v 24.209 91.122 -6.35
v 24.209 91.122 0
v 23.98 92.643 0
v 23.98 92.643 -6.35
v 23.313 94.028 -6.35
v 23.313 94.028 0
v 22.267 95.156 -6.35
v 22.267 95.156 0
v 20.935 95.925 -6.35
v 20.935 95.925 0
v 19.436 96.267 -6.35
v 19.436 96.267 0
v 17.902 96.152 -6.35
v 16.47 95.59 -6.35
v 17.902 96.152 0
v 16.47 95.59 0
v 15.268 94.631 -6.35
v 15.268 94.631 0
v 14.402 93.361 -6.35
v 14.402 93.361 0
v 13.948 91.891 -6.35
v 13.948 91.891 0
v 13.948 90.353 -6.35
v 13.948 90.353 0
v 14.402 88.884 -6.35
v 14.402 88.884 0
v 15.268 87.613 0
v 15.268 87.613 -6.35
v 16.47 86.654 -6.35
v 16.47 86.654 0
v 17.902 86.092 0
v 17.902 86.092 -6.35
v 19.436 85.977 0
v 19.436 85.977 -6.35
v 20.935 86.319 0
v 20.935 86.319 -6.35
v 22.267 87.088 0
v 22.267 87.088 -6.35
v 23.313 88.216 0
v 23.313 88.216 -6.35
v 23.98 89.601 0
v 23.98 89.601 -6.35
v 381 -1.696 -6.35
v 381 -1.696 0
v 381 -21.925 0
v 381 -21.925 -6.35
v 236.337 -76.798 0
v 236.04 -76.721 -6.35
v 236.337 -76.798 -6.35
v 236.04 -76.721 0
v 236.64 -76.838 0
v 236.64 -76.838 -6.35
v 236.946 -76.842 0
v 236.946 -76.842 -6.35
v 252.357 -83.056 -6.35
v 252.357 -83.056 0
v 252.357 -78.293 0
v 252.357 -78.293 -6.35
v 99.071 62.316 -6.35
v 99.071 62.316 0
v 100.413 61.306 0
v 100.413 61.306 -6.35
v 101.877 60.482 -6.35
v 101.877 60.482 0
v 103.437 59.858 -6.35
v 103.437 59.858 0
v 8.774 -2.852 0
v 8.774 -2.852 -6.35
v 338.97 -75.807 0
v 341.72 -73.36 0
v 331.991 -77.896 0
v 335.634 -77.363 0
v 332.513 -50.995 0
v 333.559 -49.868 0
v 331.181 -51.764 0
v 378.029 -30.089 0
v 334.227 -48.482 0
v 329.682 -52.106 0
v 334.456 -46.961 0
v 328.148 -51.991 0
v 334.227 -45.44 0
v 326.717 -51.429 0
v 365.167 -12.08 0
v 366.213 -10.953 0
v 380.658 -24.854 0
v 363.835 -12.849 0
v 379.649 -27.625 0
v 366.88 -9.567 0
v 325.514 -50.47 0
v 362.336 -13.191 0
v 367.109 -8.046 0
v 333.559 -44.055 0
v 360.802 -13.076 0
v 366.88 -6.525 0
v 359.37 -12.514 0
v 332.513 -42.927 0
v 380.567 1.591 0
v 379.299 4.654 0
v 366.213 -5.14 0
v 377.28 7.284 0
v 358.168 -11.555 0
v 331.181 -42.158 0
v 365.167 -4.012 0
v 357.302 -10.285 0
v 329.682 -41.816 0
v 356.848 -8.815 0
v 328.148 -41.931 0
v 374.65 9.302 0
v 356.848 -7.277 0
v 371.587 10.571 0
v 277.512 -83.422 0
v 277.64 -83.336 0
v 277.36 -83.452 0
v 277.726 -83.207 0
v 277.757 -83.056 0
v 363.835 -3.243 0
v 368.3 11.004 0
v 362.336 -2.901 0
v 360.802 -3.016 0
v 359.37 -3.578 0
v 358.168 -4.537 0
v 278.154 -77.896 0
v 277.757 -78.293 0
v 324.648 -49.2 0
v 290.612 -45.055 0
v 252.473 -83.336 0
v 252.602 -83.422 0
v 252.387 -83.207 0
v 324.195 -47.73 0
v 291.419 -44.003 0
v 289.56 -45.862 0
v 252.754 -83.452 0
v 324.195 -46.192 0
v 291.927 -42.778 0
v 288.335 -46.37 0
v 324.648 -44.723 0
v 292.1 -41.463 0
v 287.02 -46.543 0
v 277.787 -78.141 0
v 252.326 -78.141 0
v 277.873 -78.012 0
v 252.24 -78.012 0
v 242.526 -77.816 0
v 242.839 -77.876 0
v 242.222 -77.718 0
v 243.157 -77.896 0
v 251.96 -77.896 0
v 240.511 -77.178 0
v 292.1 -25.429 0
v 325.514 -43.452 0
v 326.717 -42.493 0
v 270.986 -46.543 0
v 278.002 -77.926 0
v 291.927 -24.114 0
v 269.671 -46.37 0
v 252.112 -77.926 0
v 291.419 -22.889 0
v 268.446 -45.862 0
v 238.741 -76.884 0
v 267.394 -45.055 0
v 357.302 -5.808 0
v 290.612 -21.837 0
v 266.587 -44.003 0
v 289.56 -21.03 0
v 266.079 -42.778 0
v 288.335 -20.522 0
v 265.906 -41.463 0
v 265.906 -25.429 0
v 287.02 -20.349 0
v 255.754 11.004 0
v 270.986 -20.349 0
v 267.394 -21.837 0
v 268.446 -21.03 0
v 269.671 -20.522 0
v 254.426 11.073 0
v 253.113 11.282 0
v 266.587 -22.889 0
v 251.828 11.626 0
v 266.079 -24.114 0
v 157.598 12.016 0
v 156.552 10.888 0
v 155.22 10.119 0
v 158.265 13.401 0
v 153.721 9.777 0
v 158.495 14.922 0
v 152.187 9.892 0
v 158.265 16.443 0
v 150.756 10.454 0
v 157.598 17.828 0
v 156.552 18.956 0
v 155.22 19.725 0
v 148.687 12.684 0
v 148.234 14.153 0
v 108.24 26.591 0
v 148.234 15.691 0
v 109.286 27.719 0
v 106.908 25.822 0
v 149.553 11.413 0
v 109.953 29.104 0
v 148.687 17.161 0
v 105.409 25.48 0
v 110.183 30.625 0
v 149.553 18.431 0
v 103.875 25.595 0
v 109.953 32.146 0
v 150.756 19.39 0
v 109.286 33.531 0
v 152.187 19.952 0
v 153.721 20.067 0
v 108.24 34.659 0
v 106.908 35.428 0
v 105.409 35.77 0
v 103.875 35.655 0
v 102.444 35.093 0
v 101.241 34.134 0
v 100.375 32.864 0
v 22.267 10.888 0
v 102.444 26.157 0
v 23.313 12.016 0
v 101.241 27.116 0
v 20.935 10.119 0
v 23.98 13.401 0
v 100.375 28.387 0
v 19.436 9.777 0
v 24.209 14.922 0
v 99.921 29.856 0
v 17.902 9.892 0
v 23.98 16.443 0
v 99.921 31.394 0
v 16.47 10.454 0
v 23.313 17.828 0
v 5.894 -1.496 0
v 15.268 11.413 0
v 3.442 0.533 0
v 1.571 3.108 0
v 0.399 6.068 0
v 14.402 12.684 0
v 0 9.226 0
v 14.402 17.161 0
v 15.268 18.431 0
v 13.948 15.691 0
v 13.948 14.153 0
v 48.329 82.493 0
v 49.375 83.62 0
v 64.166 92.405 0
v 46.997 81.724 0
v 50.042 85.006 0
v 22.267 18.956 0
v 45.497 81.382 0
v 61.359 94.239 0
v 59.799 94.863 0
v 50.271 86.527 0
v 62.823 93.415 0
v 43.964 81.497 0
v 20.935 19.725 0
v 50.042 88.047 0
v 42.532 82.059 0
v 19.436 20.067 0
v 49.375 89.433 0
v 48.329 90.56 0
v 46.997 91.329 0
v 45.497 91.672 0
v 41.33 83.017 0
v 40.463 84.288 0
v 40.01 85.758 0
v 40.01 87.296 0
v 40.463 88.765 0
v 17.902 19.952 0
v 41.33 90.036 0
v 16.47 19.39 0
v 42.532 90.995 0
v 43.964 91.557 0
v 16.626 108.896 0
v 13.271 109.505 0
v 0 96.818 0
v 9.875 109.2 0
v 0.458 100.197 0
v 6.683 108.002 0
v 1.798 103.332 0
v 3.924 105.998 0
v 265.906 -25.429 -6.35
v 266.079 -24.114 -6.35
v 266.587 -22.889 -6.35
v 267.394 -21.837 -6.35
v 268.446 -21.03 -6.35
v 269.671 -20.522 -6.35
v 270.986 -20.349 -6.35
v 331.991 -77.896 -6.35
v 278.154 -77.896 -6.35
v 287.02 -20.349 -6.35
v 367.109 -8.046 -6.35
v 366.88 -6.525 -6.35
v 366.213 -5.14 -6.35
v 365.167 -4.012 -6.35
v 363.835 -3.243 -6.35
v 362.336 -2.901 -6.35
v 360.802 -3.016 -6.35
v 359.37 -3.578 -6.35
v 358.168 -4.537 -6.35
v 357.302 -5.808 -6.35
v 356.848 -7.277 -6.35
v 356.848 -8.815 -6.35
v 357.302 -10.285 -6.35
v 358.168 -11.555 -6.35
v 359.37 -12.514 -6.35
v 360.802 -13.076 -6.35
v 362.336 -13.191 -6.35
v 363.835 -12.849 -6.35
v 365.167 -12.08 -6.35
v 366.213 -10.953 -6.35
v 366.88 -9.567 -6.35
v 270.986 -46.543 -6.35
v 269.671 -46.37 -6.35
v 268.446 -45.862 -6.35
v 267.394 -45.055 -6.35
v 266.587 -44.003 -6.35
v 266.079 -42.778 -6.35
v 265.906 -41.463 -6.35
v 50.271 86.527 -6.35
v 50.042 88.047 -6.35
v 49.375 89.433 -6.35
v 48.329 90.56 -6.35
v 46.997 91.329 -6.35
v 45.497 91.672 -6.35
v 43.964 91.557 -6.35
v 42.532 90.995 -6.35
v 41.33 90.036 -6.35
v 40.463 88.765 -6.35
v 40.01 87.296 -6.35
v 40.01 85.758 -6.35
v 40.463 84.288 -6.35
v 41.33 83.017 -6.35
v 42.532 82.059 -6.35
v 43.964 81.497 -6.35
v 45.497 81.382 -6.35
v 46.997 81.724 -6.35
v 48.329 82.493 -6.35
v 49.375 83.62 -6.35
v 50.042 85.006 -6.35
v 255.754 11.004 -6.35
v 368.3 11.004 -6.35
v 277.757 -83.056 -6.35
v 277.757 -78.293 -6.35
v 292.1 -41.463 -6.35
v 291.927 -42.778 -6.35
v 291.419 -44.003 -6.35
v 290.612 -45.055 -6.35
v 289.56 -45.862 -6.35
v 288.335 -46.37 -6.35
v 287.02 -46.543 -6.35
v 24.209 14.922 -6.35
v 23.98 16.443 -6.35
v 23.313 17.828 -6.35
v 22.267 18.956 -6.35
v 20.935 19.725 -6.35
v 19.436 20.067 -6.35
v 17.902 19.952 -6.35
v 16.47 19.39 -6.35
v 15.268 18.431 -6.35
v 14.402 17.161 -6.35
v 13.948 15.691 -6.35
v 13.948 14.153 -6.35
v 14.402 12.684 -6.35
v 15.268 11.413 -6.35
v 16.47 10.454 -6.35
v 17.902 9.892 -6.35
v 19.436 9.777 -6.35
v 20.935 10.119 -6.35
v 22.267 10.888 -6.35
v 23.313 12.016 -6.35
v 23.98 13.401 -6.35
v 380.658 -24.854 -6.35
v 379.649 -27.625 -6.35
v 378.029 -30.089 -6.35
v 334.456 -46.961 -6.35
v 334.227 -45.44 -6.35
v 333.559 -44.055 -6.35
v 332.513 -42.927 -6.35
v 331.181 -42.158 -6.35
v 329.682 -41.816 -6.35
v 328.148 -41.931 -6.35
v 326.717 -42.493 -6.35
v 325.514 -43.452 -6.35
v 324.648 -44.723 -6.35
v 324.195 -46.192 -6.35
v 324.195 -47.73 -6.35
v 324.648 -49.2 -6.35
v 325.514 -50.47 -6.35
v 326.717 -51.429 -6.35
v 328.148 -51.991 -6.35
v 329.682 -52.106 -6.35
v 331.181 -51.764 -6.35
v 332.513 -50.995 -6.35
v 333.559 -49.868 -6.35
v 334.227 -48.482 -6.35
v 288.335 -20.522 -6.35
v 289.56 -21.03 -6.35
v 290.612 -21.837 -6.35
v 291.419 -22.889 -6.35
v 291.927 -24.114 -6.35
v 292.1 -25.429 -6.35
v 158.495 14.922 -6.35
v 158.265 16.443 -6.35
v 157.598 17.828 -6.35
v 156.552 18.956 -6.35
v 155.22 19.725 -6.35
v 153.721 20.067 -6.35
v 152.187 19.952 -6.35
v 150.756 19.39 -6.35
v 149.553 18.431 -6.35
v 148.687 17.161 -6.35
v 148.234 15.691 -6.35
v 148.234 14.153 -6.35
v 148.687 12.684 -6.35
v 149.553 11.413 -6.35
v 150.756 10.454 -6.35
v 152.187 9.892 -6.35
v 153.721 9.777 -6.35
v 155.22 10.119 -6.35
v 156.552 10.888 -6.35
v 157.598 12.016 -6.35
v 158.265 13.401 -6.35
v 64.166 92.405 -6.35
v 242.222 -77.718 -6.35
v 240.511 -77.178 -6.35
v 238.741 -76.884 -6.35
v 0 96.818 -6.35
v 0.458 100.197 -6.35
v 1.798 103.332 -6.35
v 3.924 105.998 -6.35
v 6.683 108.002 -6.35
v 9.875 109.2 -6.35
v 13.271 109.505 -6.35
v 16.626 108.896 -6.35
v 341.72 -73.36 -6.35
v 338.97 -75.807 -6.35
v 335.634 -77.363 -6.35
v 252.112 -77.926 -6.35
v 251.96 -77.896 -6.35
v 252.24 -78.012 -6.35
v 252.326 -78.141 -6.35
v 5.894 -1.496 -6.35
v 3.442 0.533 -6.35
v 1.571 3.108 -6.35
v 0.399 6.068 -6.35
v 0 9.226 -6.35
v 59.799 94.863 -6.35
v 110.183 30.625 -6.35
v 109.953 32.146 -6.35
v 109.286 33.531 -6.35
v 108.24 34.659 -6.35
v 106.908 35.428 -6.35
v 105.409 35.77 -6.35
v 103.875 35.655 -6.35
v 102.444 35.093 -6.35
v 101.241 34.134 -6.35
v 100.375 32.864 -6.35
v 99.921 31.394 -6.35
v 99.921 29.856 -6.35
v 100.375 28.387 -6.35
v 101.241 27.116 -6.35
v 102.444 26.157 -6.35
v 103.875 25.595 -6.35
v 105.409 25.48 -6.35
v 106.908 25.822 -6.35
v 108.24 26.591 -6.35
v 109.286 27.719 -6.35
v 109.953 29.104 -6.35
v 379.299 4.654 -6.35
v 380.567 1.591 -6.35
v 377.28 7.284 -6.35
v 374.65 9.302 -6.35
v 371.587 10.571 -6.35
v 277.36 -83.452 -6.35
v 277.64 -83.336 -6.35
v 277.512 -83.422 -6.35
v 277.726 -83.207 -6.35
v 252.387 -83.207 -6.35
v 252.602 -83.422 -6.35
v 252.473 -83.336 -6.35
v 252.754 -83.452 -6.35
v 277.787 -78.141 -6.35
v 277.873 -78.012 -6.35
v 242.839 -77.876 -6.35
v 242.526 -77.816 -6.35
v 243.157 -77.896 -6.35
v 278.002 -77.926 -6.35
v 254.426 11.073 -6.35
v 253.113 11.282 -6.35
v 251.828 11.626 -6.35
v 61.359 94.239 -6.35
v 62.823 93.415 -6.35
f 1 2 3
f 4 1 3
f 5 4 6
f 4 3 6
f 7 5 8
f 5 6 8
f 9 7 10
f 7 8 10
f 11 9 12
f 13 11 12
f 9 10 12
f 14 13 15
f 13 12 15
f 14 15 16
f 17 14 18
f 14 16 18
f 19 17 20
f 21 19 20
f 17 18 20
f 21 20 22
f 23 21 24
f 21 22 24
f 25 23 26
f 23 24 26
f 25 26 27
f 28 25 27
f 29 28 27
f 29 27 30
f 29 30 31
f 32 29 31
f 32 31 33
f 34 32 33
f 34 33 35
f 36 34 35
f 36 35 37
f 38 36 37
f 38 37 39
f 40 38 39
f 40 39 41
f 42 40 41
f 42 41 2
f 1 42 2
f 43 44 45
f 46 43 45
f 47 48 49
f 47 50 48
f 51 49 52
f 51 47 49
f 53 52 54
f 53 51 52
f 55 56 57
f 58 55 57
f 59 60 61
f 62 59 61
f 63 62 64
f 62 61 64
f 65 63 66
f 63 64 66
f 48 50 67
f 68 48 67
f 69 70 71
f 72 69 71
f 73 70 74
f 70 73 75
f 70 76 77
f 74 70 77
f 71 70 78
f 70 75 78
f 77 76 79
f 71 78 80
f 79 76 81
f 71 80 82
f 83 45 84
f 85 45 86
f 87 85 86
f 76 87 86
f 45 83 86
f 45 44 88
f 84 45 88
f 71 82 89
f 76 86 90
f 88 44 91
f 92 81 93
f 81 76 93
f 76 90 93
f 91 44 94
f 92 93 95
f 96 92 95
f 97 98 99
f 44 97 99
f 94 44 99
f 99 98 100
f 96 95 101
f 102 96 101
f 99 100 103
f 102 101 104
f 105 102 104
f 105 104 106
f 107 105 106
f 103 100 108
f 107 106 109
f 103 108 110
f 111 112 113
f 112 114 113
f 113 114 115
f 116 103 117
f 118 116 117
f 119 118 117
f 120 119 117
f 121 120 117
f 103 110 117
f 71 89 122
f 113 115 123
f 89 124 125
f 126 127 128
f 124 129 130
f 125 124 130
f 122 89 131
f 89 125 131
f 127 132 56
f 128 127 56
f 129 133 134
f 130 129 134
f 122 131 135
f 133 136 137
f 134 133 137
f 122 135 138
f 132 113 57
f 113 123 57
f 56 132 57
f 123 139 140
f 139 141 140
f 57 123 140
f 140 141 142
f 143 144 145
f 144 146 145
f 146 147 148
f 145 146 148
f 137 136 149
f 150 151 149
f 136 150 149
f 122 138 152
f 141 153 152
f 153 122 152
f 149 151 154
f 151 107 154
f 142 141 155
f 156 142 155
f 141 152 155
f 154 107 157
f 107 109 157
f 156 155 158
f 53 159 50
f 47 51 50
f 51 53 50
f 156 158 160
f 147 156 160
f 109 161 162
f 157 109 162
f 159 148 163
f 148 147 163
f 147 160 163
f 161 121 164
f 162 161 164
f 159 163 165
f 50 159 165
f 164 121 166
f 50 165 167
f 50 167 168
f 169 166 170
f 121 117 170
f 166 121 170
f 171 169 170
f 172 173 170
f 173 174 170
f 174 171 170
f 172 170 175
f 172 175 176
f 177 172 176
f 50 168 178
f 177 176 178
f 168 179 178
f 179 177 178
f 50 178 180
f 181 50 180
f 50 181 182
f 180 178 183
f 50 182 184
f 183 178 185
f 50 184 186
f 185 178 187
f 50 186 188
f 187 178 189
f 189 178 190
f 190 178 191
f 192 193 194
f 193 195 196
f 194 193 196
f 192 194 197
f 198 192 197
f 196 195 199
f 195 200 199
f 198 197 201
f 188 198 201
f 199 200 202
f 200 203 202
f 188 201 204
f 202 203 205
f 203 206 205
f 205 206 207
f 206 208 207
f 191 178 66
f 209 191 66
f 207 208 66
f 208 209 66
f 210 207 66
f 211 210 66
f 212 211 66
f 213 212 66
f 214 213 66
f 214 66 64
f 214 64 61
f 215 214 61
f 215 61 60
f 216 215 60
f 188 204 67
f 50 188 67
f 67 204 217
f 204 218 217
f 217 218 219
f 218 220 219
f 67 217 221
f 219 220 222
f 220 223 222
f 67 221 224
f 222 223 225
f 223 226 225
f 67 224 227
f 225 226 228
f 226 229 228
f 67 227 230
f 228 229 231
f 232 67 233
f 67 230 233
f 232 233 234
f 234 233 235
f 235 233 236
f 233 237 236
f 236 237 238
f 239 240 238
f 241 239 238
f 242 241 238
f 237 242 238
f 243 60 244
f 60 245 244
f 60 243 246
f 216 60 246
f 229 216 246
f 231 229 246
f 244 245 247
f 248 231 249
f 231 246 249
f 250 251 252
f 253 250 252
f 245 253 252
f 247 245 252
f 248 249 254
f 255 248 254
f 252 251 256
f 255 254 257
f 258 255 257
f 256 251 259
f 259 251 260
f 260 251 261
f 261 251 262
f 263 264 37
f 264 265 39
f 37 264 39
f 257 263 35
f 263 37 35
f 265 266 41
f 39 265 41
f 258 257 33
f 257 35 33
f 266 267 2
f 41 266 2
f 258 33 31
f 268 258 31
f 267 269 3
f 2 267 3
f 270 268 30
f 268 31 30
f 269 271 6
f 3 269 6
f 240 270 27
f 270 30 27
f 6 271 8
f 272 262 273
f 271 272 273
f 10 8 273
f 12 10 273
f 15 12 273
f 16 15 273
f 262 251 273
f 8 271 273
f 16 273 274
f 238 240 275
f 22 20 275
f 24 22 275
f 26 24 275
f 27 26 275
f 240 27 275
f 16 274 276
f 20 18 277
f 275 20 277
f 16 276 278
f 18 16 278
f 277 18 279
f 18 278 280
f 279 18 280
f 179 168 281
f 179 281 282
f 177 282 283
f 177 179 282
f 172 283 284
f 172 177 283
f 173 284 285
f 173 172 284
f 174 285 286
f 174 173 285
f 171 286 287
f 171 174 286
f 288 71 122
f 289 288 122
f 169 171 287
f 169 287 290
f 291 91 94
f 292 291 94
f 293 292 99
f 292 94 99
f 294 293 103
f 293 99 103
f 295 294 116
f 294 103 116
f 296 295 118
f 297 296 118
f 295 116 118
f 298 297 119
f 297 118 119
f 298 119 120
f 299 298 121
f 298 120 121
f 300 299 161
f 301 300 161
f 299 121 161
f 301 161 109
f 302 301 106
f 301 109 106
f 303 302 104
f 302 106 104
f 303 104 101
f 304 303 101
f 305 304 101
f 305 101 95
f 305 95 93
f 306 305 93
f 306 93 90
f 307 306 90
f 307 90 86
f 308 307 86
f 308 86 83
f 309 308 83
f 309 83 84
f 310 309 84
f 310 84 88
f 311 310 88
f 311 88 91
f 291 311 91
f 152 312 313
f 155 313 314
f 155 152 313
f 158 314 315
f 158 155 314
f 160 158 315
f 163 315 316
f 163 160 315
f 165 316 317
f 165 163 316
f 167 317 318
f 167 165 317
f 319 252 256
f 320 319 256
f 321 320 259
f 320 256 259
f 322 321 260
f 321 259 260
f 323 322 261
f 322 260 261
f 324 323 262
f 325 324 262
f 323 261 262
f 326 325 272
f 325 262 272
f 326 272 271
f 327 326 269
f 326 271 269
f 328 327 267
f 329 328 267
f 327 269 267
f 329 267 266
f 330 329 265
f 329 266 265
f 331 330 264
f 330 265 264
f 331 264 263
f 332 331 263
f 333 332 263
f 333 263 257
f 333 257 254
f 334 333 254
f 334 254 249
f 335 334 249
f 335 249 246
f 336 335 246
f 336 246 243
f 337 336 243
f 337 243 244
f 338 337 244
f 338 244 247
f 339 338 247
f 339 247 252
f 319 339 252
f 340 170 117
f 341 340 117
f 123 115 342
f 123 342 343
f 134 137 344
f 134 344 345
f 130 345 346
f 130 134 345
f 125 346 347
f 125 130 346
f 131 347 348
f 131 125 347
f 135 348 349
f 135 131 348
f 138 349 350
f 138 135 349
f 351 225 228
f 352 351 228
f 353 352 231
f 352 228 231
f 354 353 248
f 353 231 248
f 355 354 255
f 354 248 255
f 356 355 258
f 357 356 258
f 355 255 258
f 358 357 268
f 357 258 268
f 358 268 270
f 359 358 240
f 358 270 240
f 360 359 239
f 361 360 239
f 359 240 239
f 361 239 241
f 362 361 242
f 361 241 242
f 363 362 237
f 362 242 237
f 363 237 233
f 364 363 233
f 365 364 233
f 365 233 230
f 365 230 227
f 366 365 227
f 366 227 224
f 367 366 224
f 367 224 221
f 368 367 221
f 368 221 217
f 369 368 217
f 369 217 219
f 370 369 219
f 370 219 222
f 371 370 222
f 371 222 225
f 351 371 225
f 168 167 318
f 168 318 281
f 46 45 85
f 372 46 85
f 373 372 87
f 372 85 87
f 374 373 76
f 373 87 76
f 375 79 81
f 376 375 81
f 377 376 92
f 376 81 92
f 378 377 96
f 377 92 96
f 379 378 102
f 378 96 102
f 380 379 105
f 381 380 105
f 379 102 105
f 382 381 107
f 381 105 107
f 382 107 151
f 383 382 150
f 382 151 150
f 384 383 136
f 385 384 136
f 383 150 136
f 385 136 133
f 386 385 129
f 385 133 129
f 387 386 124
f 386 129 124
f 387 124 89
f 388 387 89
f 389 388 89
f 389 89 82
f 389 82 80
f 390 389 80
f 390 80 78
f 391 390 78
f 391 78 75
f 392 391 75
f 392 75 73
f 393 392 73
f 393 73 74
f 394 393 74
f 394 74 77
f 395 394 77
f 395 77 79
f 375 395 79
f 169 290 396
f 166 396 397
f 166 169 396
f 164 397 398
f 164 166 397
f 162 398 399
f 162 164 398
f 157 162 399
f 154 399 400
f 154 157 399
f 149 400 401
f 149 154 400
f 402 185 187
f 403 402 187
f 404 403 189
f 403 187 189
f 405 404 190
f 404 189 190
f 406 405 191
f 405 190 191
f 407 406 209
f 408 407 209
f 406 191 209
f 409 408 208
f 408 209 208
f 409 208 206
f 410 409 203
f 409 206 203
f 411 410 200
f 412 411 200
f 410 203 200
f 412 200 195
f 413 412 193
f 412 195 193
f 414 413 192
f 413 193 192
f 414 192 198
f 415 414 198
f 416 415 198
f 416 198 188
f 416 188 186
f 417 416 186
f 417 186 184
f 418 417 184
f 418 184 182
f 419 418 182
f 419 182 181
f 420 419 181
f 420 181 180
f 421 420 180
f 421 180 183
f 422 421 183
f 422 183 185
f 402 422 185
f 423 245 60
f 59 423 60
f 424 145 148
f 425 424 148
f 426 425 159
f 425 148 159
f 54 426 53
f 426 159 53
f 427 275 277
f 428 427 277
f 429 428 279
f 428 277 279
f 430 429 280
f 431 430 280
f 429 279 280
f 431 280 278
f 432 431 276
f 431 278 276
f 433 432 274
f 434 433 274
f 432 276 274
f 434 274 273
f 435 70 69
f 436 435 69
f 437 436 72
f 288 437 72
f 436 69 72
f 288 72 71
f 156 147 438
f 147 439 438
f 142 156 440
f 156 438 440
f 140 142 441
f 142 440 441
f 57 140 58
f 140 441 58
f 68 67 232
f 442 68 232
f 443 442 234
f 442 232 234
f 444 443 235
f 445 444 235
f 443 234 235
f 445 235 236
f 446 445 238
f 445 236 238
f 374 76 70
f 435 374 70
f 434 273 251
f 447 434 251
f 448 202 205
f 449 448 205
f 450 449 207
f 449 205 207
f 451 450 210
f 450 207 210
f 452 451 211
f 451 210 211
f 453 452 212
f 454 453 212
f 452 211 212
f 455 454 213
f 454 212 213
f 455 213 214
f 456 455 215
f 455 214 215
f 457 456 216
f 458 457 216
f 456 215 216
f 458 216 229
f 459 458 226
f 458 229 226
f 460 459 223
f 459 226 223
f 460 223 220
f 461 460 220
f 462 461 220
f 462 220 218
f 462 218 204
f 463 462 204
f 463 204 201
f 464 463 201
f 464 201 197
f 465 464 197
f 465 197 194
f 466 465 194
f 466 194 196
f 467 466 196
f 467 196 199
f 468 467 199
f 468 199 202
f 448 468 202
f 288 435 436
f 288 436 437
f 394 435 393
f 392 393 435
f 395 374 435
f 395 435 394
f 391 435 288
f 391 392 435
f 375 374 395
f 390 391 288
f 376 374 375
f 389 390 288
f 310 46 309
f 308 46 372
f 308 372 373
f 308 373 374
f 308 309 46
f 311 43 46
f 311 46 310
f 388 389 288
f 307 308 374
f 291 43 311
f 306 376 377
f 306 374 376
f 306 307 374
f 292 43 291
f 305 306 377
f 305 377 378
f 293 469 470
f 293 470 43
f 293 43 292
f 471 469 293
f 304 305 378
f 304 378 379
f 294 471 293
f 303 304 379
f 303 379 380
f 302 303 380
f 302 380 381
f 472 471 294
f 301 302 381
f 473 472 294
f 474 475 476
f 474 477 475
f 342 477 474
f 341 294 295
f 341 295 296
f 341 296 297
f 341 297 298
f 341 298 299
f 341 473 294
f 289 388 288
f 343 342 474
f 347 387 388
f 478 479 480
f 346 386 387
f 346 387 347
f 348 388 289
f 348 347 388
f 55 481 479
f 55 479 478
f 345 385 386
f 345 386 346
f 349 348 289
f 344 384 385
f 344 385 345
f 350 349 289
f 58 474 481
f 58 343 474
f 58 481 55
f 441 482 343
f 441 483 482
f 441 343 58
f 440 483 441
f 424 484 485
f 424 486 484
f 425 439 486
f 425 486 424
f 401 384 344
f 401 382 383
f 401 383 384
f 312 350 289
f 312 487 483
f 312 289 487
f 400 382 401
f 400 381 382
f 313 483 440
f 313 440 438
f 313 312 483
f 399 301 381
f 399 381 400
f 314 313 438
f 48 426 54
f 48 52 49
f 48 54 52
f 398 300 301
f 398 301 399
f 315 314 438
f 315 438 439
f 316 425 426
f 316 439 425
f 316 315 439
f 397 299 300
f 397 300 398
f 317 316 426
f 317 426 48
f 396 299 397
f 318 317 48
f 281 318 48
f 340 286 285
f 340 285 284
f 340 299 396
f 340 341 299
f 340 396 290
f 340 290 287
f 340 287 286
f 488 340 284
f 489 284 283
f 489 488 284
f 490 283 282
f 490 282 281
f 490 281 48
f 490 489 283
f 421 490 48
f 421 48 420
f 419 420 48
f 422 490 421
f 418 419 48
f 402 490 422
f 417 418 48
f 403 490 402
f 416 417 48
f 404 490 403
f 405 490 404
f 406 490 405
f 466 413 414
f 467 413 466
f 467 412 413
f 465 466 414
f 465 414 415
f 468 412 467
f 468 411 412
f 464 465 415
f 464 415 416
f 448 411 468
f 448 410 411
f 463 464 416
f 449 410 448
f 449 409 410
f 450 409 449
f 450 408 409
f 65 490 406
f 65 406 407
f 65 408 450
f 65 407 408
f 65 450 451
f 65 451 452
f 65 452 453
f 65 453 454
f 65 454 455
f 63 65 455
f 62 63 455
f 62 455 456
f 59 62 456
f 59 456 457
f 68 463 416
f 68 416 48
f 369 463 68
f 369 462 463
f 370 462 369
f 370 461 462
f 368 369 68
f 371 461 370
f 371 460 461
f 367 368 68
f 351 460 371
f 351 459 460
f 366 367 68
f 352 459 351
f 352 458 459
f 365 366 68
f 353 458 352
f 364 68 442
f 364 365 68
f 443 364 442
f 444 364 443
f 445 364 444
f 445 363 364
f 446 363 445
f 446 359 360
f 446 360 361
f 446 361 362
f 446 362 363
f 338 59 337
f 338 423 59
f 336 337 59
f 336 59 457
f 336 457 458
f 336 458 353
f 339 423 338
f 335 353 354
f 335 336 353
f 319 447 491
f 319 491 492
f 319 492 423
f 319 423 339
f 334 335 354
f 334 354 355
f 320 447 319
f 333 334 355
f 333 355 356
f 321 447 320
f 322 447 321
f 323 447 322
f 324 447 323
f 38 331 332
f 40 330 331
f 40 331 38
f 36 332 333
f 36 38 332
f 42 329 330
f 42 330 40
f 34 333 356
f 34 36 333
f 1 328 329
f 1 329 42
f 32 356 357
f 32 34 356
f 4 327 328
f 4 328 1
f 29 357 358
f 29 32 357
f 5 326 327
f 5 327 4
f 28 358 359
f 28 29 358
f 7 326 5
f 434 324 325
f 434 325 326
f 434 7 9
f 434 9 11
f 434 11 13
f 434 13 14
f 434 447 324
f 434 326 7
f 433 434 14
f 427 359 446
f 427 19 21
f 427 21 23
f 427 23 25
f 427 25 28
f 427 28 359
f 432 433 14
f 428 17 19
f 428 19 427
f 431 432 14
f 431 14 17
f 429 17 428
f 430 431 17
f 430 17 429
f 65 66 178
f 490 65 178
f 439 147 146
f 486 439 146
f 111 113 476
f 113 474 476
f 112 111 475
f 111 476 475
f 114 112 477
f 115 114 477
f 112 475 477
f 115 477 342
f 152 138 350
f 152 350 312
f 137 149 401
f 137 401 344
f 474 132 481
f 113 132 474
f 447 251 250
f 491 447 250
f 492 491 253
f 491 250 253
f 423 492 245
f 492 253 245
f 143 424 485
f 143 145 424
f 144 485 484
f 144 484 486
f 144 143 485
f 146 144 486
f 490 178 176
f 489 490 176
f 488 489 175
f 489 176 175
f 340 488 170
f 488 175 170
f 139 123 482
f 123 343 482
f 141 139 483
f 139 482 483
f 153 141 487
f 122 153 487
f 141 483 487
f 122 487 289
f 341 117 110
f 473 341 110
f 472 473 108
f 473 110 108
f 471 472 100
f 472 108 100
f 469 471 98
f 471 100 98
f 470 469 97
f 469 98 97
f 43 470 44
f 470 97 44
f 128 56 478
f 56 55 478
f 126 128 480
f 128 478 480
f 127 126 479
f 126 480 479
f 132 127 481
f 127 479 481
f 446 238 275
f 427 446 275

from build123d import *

# Parameters (mm, degrees)
BASE_FLANGE1_DEPTH = 6.35
SKETCH7_W          = 25.4
SKETCH7_H          = 5.55625
TAB1_DEPTH         = 6.35
SKETCH10_R         = 5.159375
CUT_EXTRUDE1_DEPTH = 397.478917898
CUT_EXTRUDE2_DEPTH = 397.478917898
SKETCH12_R         = 12.7
CUT_EXTRUDE4_DEPTH = 397.478917898
FILLET1_R          = 2.54
FILLET2_R          = 0.396875


# Sheet-metal steps are written as plain solids
with BuildPart() as part:
    # Sketch2 → Base-Flange1 (new body)
    with BuildSketch(Plane.XY):
        with BuildLine():
            Line((0, 9.226103289), (0, 96.818079958))
            ThreePointArc((0, 96.818079958), (5.235649853, 107.092975426), (16.62574439, 108.896098462))
            Line((16.62574439, 108.896098462), (59.799322894, 94.863297175))
            ThreePointArc((59.799322894, 94.863297175), (62.104900611, 93.851471549), (64.16555713, 92.40469084))
            Line((64.16555713, 92.40469084), (99.070578742, 62.316397702))
            ThreePointArc((99.070578742, 62.316397702), (101.131235261, 60.869616993), (103.436812978, 59.857791367))
            Line((103.436812978, 59.857791367), (251.828096727, 11.625852535))
            ThreePointArc((251.828096727, 11.625852535), (253.766485462, 11.160330172), (255.753841117, 11.003871039))
            Line((255.753841117, 11.003871039), (368.3, 11.003871039))
            ThreePointArc((368.3, 11.003871039), (377.280256121, 7.28412716), (381, -1.696128961))
            Line((381, -1.696128961), (381, -21.925343231))
            ThreePointArc((381, -21.925343231), (380.234096284, -26.268999051), (378.028764428, -30.088745874))
            Line((378.028764428, -30.088745874), (341.720264081, -73.359531604))
            ThreePointArc((341.720264081, -73.359531604), (337.358751578, -76.706237856), (331.991499654, -77.896128961))
            Line((331.991499654, -77.896128961), (239.656685085, -77.896128961))
            Line((239.656685085, -77.896128961), (8.77425561, -2.851915215))
            ThreePointArc((8.77425561, -2.851915215), (2.425104532, 1.761753142), (0, 9.226103289))
        make_face()
    extrude(amount=-BASE_FLANGE1_DEPTH)

    # Sketch7 → Tab1 (add)
    with BuildSketch(Plane.XY):
        with Locations((265.056685085, -80.674253961)):
            Rectangle(SKETCH7_W, SKETCH7_H)
    extrude(amount=-TAB1_DEPTH)

    # Sketch10 → Cut-Extrude1 (cut, through all)
    with BuildSketch(Plane.XY):
        with Locations((361.95, -8.046128961)):
            Circle(SKETCH10_R)
        with Locations((329.296389428, -46.961186671)):
            Circle(SKETCH10_R)
        with Locations((19.05, 91.122091624)):
            Circle(SKETCH10_R)
        with Locations((19.05, 14.922091624)):
            Circle(SKETCH10_R)
        with Locations((45.111934921, 86.526669328)):
            Circle(SKETCH10_R)
        with Locations((153.335293858, 14.922091624)):
            Circle(SKETCH10_R)
        with Locations((105.023219841, 30.625069183)):
            Circle(SKETCH10_R)
    extrude(amount=-CUT_EXTRUDE1_DEPTH, mode=Mode.SUBTRACT)

    # Sketch11 → Cut-Extrude2 (cut, through all)
    with BuildSketch(Plane.XY):
        with BuildLine():
            Line((270.98625, -20.349253961), (287.02, -20.349253961))
            ThreePointArc((287.02, -20.349253961), (290.612102448, -21.837151512), (292.1, -25.429253961))
            Line((292.1, -25.429253961), (292.1, -41.463003961))
            ThreePointArc((292.1, -41.463003961), (290.612102448, -45.055106409), (287.02, -46.543003961))
            Line((287.02, -46.543003961), (270.98625, -46.543003961))
            ThreePointArc((270.98625, -46.543003961), (267.394147552, -45.055106409), (265.90625, -41.463003961))
            Line((265.90625, -41.463003961), (265.90625, -25.429253961))
            ThreePointArc((265.90625, -25.429253961), (267.394147552, -21.837151512), (270.98625, -20.349253961))
        make_face()
    extrude(amount=-CUT_EXTRUDE2_DEPTH, mode=Mode.SUBTRACT)

    # Sketch12 → Cut-Extrude4 (cut, through all)
    with BuildSketch(Plane.XY):
        with Locations((237.551232799, -89.527827626)):
            Circle(SKETCH12_R)
    extrude(amount=-CUT_EXTRUDE4_DEPTH, mode=Mode.SUBTRACT)

    # Fillet1
    fillet1_edges = [part.edges().sort_by_distance(p)[0] for p in [
        (236.503199055, -76.871144598, -3.175),
        (242.649623344, -77.896128961, -3.175),
    ]]
    fillet(fillet1_edges, radius=FILLET1_R)

    # Fillet2
    fillet2_edges = [part.edges().sort_by_distance(p)[0] for p in [
        (252.356685085, -77.896128961, -3.175),
        (277.756685085, -77.896128961, -3.175),
        (277.756685085, -83.452378961, -3.175),
        (252.356685085, -83.452378961, -3.175),
    ]]
    fillet(fillet2_edges, radius=FILLET2_R)


solid = part.part
